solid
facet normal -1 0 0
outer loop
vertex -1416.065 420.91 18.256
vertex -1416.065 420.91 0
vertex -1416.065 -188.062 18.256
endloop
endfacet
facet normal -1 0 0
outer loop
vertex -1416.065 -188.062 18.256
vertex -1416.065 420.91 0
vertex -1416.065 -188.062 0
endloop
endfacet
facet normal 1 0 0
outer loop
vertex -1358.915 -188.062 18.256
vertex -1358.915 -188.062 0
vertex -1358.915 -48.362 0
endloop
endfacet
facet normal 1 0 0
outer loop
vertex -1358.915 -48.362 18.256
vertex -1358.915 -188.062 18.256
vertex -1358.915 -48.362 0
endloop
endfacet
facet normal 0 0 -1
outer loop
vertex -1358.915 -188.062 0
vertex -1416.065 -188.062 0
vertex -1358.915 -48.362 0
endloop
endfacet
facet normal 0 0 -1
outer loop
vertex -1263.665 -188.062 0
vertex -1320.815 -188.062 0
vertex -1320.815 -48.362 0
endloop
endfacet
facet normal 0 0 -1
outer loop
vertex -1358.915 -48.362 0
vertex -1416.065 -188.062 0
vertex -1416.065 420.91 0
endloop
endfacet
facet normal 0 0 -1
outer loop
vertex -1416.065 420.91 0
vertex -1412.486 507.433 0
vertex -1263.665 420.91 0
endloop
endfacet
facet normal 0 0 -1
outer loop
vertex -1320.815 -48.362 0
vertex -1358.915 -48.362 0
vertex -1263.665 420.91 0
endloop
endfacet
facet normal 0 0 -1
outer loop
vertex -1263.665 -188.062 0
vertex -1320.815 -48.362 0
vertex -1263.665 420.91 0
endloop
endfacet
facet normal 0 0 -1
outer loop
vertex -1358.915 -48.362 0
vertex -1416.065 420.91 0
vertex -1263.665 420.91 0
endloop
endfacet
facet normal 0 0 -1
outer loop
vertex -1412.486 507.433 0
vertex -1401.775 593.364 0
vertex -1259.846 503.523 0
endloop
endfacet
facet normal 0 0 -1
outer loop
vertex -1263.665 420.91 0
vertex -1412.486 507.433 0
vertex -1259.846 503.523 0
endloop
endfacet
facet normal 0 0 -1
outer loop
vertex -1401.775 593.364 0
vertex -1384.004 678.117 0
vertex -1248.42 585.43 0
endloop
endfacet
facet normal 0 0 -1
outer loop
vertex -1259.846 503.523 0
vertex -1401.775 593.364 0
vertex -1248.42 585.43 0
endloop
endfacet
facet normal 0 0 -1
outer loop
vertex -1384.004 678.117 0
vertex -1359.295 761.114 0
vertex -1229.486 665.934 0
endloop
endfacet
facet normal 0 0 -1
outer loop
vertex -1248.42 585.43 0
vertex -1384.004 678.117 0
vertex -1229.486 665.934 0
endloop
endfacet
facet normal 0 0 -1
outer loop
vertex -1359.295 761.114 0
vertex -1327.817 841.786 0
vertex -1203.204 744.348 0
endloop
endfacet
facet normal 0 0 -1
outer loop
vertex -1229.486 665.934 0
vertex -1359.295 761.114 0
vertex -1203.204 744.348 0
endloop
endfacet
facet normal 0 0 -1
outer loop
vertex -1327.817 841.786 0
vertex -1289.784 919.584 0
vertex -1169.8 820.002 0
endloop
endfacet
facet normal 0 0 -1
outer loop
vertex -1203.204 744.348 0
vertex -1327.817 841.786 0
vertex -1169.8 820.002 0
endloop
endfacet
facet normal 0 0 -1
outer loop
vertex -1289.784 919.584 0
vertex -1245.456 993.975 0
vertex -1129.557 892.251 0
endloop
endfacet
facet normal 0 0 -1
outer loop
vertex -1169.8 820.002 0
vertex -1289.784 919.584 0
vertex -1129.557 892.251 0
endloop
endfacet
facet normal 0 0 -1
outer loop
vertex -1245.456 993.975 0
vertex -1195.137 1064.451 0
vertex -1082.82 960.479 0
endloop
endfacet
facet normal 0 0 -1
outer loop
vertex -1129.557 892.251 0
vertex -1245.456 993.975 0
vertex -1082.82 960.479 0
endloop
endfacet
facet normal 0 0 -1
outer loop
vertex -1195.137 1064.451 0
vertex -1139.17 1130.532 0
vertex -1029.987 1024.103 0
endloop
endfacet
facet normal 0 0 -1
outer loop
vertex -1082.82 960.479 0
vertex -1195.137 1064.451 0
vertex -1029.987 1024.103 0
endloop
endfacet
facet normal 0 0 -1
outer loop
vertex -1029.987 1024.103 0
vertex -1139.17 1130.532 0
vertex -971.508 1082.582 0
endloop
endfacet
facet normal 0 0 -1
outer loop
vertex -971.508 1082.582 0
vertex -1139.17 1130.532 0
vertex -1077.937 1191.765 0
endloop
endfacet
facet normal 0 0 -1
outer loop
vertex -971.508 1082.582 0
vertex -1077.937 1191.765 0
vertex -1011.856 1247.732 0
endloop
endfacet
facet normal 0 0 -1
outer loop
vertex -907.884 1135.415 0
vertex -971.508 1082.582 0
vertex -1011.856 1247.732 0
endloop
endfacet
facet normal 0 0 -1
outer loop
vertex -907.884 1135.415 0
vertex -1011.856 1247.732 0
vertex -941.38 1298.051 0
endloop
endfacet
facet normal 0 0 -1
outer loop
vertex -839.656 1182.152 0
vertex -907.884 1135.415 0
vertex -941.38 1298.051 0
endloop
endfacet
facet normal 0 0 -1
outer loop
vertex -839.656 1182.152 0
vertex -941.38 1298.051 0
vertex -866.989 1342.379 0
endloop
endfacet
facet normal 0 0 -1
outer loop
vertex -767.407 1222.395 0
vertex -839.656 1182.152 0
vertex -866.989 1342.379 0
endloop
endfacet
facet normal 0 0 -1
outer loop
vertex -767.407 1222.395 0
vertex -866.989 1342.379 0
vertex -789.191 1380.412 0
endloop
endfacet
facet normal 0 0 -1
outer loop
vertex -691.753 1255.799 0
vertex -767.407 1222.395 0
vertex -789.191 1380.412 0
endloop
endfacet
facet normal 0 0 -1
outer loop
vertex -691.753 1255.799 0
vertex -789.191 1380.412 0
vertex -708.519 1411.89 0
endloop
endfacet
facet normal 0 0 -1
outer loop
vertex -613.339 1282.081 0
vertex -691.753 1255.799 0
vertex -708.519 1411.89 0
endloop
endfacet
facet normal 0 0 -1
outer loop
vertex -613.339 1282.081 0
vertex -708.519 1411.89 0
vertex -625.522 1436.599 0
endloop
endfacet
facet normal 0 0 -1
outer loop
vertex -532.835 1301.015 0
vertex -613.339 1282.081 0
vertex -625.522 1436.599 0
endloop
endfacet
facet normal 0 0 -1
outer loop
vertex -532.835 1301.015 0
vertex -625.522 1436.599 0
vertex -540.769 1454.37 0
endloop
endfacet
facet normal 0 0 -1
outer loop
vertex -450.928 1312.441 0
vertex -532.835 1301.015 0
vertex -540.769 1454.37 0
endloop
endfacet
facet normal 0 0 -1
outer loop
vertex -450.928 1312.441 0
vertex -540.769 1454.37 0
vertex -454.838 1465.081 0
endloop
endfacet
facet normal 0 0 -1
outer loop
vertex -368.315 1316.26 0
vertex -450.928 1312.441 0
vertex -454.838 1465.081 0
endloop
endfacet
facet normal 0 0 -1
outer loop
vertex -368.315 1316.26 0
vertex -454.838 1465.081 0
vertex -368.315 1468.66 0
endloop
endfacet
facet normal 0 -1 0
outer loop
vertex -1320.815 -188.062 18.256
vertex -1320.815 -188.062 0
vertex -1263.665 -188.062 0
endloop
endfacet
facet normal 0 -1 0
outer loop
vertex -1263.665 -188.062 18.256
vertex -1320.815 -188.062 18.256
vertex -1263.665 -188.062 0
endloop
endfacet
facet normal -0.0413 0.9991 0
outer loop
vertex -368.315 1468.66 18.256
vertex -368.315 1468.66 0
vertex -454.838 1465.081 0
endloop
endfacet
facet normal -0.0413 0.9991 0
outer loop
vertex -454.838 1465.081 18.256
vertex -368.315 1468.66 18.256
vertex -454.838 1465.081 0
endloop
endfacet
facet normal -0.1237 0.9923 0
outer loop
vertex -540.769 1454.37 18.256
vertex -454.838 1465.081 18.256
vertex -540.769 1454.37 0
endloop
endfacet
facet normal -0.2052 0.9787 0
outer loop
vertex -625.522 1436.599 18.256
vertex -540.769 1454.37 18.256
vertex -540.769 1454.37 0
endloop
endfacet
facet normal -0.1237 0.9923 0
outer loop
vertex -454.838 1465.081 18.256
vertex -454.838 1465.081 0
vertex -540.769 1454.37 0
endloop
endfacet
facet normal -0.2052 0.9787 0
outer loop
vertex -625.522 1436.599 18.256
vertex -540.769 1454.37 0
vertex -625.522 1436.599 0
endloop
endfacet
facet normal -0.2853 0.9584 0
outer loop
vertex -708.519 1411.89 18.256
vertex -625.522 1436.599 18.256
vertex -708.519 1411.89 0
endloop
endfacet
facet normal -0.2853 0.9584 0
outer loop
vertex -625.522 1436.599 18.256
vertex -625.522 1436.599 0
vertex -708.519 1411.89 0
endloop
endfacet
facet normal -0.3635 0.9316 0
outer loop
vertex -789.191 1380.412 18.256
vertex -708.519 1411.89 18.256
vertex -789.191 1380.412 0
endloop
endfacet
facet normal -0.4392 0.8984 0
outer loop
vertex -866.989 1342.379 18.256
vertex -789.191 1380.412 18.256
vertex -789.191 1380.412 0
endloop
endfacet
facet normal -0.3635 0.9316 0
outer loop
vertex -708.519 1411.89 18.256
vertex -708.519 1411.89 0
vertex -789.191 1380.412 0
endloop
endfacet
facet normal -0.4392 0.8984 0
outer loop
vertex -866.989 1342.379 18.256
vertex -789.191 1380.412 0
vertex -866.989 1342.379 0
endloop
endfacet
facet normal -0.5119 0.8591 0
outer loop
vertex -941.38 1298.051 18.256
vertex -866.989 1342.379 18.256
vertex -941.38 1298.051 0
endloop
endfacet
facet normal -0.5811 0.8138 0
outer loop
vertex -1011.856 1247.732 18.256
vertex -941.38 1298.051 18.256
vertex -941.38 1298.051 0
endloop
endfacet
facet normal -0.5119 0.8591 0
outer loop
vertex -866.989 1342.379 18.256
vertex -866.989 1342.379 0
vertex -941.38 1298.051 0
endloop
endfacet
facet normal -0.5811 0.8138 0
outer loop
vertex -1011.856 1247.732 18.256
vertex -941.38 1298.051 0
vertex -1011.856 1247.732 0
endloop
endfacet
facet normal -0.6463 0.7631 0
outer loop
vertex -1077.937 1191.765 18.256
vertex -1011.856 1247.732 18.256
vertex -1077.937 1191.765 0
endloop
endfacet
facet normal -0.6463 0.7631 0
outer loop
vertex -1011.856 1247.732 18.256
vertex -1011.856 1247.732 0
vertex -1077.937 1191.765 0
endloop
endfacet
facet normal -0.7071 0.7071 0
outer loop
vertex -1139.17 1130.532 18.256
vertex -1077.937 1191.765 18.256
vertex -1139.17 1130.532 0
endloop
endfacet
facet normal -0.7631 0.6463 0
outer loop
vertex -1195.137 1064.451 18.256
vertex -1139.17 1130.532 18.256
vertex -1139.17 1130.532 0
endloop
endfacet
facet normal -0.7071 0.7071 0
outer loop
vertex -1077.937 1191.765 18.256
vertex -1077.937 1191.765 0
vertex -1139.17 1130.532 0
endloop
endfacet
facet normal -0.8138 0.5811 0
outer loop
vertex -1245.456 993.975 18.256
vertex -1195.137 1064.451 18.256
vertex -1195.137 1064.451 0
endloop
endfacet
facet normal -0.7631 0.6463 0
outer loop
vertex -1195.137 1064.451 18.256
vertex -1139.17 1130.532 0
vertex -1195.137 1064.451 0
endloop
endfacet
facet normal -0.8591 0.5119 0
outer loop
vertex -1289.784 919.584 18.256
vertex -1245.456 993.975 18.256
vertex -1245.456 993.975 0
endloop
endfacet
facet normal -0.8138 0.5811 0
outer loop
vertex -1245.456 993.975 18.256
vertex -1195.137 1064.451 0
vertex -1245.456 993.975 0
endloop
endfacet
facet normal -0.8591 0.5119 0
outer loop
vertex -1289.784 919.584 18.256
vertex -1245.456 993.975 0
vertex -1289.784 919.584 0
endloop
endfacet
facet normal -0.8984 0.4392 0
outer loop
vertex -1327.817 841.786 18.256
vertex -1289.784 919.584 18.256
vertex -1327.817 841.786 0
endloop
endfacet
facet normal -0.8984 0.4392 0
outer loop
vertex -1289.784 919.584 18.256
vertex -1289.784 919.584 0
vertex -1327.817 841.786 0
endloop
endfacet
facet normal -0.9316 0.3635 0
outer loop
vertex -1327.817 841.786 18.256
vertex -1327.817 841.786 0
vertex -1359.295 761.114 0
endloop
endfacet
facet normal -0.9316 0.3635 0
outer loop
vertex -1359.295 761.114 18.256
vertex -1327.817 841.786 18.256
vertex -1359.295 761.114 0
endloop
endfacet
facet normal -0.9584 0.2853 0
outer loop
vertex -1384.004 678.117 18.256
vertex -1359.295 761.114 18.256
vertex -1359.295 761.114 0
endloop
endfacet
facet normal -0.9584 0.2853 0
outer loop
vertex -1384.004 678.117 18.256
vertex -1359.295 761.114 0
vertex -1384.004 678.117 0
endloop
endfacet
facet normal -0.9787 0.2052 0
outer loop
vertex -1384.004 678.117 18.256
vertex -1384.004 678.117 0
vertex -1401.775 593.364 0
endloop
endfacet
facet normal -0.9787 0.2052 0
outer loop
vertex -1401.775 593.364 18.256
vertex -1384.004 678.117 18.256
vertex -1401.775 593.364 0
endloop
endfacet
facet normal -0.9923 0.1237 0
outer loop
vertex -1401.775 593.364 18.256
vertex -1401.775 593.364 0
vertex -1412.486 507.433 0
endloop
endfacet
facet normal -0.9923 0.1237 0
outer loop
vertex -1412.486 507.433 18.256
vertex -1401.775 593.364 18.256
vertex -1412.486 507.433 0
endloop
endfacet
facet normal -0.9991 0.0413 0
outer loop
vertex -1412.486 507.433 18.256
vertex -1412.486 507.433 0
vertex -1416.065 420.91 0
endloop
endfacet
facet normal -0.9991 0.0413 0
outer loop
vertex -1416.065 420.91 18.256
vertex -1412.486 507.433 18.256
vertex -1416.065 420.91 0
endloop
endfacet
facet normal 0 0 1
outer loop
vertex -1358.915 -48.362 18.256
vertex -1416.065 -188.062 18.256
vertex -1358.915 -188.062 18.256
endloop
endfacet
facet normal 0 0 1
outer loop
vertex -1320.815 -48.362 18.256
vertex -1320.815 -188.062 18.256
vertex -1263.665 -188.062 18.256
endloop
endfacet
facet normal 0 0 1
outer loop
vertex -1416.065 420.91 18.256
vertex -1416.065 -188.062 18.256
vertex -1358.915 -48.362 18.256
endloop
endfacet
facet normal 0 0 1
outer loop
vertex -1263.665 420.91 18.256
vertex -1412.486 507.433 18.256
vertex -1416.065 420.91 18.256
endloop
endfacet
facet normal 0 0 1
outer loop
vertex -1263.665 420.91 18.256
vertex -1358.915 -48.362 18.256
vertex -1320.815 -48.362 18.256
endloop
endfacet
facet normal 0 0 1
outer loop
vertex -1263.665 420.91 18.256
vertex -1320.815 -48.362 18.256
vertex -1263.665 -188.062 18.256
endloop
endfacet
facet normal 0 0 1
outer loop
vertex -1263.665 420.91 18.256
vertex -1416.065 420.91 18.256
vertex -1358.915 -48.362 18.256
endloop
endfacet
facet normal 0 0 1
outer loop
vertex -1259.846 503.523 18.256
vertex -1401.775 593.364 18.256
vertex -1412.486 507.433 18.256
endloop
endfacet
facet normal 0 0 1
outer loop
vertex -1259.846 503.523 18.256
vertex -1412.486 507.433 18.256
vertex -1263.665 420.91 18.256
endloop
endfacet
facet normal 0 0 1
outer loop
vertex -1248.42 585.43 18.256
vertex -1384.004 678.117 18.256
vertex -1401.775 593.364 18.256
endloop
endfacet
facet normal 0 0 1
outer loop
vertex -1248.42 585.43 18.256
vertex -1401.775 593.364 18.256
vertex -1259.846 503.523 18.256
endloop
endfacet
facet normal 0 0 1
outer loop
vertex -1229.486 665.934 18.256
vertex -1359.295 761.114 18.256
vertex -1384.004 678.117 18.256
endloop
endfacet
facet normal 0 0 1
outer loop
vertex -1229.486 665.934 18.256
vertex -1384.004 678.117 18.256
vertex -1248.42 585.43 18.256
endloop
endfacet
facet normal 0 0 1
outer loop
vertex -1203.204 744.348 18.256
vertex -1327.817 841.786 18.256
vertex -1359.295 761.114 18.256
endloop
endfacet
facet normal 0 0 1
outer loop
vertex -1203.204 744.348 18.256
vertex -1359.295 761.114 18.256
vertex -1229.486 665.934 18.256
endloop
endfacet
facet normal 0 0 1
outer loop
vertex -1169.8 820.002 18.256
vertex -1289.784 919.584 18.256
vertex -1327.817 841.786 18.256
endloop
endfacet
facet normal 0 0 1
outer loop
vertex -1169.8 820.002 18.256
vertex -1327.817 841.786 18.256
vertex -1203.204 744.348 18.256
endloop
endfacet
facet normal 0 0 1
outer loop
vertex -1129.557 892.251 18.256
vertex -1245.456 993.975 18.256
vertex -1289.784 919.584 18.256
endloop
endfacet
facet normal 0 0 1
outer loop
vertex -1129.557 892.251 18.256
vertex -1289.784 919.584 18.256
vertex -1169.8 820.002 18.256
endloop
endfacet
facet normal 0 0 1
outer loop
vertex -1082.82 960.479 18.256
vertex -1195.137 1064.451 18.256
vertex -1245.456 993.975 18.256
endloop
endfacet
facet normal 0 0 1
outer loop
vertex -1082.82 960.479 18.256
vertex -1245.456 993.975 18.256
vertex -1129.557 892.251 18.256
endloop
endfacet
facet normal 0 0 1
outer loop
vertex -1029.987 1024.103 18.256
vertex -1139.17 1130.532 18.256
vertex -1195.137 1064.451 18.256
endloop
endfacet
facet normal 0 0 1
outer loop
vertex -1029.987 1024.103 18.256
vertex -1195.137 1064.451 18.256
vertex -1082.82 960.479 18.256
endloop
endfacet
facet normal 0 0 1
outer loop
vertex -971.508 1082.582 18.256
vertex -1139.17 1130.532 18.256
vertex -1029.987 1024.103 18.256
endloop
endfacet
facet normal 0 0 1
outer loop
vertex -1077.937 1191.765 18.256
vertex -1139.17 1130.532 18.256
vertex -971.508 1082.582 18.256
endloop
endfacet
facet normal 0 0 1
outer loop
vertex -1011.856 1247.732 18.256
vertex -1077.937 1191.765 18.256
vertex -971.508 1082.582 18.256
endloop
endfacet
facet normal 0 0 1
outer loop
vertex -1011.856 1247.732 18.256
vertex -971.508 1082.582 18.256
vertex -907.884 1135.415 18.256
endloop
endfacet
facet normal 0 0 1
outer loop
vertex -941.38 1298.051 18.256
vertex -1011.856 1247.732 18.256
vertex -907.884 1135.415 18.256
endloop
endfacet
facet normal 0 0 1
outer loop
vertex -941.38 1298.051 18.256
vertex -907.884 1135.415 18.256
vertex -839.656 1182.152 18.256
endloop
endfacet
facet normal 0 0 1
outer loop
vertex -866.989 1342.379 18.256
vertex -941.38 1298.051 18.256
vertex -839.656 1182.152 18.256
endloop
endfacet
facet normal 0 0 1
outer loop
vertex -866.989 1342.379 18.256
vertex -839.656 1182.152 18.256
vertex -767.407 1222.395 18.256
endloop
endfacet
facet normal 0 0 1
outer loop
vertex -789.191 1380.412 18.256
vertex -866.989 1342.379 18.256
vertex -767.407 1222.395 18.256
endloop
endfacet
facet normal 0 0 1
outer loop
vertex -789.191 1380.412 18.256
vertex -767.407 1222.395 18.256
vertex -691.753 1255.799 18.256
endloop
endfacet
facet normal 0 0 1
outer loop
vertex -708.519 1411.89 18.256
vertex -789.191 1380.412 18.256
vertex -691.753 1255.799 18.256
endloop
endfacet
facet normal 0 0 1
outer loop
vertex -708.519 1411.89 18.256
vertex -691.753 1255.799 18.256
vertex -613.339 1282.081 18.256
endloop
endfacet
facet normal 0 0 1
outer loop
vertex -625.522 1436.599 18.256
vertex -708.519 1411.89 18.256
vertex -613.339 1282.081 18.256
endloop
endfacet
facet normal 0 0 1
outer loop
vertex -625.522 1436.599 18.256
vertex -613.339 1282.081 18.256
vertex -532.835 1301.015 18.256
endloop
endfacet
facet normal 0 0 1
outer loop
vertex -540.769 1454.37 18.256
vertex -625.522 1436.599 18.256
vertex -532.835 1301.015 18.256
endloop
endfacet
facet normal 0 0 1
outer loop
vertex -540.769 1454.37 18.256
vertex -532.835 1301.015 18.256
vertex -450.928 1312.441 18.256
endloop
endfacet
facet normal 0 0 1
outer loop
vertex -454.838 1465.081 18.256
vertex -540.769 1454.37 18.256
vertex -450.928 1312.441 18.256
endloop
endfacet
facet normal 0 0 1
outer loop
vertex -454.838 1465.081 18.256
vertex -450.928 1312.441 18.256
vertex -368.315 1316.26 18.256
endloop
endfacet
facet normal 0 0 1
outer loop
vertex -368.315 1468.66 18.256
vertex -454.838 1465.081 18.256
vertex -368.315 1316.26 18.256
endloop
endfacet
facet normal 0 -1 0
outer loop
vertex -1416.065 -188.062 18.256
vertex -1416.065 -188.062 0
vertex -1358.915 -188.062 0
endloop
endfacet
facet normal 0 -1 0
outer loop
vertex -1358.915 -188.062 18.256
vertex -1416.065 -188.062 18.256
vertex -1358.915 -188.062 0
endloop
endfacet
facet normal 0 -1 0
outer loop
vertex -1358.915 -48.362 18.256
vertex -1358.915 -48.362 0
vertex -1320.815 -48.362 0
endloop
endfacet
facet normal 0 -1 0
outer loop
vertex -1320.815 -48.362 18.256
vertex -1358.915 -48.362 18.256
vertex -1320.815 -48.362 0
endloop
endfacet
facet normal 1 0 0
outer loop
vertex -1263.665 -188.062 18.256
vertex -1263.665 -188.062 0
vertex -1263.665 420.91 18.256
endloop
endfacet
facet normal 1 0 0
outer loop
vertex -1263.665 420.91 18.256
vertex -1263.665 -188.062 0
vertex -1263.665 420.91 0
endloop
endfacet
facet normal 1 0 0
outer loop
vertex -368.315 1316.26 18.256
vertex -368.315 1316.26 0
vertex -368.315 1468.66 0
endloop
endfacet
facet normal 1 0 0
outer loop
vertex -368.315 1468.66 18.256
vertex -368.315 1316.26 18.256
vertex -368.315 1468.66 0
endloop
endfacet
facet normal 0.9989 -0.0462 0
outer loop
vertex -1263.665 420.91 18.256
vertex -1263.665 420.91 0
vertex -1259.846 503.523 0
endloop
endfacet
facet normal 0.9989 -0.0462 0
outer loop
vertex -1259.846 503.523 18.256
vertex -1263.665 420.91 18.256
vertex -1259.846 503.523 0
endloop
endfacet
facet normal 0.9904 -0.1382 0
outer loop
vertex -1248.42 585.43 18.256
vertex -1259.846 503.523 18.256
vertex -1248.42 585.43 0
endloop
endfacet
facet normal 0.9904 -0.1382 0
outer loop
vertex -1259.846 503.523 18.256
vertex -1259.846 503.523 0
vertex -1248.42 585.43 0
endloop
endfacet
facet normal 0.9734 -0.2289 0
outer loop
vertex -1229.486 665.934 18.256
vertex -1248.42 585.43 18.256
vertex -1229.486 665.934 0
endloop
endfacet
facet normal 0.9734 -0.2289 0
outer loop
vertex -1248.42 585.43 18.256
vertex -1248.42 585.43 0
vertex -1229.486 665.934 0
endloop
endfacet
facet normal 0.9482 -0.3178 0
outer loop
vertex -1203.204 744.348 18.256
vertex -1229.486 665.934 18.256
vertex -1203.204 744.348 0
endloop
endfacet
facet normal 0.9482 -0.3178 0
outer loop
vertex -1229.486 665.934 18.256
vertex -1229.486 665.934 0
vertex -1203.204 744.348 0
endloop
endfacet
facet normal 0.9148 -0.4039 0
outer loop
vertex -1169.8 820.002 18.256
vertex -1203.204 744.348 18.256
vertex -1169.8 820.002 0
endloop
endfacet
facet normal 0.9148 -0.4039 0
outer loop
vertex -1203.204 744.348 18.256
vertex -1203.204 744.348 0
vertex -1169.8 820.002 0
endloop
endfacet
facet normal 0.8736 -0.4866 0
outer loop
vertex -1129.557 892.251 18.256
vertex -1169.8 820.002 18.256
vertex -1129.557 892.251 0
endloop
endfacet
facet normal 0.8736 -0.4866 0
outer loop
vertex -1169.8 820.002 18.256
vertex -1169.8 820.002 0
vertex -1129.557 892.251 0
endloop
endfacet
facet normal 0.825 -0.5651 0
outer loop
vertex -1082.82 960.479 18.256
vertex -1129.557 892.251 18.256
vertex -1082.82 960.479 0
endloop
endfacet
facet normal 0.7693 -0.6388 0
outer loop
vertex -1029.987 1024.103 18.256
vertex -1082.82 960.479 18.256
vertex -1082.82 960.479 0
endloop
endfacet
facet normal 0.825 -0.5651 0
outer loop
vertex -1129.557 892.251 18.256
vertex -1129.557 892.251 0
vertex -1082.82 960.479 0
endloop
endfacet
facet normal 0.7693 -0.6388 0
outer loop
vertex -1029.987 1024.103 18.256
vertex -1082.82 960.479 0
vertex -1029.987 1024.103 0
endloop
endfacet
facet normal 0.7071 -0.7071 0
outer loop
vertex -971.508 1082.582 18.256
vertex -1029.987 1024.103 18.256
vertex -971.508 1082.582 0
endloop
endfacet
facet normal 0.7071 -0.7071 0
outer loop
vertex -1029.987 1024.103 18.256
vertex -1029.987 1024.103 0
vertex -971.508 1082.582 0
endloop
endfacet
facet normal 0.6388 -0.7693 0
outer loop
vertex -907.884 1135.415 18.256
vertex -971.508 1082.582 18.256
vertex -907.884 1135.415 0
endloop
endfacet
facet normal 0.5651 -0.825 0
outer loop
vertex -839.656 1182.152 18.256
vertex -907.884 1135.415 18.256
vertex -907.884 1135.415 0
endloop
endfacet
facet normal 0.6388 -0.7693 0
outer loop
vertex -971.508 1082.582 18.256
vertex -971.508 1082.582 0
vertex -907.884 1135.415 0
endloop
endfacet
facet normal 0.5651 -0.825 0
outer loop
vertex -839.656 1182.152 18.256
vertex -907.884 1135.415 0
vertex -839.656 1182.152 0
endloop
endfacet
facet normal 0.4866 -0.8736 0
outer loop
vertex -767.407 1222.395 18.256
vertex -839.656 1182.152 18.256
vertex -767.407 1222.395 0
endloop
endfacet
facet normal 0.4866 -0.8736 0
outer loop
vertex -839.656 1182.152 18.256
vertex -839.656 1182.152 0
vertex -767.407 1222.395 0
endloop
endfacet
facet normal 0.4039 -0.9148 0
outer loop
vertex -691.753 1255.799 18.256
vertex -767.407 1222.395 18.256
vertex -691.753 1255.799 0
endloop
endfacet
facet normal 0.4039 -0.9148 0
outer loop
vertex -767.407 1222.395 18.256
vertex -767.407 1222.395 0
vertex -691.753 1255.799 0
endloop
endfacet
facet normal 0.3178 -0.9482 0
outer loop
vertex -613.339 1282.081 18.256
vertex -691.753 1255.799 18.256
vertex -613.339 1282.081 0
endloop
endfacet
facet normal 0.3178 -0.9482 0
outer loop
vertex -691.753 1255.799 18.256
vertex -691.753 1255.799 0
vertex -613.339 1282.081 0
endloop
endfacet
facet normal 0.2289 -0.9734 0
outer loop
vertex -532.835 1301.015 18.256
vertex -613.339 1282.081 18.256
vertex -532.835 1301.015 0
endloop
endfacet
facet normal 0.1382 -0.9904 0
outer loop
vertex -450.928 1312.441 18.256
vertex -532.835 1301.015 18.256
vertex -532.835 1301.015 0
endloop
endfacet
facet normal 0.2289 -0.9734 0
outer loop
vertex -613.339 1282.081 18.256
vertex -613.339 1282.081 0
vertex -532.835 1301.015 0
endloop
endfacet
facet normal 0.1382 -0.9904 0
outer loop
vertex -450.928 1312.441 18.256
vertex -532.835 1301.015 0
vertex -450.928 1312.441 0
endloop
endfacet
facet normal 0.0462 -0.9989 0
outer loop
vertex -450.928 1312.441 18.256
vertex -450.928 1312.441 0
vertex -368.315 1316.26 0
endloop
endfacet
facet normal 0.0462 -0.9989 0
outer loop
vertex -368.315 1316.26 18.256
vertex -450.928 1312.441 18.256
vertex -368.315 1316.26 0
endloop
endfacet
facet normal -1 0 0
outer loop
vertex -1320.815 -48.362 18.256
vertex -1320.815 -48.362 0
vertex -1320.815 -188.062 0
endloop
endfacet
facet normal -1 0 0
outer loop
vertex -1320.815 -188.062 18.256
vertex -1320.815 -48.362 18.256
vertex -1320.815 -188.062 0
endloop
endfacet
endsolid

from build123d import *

# Parameters (mm, degrees)
BOSS_EXTRUDE1_DEPTH = 18.25625


with BuildPart() as part:
    # Sketch1 → Boss-Extrude1 (new body)
    with BuildSketch(Plane.XY):
        with BuildLine():
            ThreePointArc((-368.315070695, 1468.660053657), (-1109.186200683, 1161.781183645), (-1416.065070695, 420.910053657))
            Line((-1416.065070695, 420.910053657), (-1416.065070695, -188.062492737))
            Line((-1416.065070695, -188.062492737), (-1358.915070695, -188.062492737))
            Line((-1358.915070695, -188.062492737), (-1358.915070695, -48.362492737))
            Line((-1358.915070695, -48.362492737), (-1320.815070695, -48.362492737))
            Line((-1320.815070695, -48.362492737), (-1320.815070695, -188.062492737))
            Line((-1320.815070695, -188.062492737), (-1263.665070695, -188.062492737))
            Line((-1263.665070695, -188.062492737), (-1263.665070695, 420.910053657))
            ThreePointArc((-1263.665070695, 420.910053657), (-1001.42312723, 1054.018110192), (-368.315070695, 1316.260053657))
            Line((-368.315070695, 1316.260053657), (-368.315070695, 1468.660053657))
        make_face()
    extrude(amount=BOSS_EXTRUDE1_DEPTH)


solid = part.part
